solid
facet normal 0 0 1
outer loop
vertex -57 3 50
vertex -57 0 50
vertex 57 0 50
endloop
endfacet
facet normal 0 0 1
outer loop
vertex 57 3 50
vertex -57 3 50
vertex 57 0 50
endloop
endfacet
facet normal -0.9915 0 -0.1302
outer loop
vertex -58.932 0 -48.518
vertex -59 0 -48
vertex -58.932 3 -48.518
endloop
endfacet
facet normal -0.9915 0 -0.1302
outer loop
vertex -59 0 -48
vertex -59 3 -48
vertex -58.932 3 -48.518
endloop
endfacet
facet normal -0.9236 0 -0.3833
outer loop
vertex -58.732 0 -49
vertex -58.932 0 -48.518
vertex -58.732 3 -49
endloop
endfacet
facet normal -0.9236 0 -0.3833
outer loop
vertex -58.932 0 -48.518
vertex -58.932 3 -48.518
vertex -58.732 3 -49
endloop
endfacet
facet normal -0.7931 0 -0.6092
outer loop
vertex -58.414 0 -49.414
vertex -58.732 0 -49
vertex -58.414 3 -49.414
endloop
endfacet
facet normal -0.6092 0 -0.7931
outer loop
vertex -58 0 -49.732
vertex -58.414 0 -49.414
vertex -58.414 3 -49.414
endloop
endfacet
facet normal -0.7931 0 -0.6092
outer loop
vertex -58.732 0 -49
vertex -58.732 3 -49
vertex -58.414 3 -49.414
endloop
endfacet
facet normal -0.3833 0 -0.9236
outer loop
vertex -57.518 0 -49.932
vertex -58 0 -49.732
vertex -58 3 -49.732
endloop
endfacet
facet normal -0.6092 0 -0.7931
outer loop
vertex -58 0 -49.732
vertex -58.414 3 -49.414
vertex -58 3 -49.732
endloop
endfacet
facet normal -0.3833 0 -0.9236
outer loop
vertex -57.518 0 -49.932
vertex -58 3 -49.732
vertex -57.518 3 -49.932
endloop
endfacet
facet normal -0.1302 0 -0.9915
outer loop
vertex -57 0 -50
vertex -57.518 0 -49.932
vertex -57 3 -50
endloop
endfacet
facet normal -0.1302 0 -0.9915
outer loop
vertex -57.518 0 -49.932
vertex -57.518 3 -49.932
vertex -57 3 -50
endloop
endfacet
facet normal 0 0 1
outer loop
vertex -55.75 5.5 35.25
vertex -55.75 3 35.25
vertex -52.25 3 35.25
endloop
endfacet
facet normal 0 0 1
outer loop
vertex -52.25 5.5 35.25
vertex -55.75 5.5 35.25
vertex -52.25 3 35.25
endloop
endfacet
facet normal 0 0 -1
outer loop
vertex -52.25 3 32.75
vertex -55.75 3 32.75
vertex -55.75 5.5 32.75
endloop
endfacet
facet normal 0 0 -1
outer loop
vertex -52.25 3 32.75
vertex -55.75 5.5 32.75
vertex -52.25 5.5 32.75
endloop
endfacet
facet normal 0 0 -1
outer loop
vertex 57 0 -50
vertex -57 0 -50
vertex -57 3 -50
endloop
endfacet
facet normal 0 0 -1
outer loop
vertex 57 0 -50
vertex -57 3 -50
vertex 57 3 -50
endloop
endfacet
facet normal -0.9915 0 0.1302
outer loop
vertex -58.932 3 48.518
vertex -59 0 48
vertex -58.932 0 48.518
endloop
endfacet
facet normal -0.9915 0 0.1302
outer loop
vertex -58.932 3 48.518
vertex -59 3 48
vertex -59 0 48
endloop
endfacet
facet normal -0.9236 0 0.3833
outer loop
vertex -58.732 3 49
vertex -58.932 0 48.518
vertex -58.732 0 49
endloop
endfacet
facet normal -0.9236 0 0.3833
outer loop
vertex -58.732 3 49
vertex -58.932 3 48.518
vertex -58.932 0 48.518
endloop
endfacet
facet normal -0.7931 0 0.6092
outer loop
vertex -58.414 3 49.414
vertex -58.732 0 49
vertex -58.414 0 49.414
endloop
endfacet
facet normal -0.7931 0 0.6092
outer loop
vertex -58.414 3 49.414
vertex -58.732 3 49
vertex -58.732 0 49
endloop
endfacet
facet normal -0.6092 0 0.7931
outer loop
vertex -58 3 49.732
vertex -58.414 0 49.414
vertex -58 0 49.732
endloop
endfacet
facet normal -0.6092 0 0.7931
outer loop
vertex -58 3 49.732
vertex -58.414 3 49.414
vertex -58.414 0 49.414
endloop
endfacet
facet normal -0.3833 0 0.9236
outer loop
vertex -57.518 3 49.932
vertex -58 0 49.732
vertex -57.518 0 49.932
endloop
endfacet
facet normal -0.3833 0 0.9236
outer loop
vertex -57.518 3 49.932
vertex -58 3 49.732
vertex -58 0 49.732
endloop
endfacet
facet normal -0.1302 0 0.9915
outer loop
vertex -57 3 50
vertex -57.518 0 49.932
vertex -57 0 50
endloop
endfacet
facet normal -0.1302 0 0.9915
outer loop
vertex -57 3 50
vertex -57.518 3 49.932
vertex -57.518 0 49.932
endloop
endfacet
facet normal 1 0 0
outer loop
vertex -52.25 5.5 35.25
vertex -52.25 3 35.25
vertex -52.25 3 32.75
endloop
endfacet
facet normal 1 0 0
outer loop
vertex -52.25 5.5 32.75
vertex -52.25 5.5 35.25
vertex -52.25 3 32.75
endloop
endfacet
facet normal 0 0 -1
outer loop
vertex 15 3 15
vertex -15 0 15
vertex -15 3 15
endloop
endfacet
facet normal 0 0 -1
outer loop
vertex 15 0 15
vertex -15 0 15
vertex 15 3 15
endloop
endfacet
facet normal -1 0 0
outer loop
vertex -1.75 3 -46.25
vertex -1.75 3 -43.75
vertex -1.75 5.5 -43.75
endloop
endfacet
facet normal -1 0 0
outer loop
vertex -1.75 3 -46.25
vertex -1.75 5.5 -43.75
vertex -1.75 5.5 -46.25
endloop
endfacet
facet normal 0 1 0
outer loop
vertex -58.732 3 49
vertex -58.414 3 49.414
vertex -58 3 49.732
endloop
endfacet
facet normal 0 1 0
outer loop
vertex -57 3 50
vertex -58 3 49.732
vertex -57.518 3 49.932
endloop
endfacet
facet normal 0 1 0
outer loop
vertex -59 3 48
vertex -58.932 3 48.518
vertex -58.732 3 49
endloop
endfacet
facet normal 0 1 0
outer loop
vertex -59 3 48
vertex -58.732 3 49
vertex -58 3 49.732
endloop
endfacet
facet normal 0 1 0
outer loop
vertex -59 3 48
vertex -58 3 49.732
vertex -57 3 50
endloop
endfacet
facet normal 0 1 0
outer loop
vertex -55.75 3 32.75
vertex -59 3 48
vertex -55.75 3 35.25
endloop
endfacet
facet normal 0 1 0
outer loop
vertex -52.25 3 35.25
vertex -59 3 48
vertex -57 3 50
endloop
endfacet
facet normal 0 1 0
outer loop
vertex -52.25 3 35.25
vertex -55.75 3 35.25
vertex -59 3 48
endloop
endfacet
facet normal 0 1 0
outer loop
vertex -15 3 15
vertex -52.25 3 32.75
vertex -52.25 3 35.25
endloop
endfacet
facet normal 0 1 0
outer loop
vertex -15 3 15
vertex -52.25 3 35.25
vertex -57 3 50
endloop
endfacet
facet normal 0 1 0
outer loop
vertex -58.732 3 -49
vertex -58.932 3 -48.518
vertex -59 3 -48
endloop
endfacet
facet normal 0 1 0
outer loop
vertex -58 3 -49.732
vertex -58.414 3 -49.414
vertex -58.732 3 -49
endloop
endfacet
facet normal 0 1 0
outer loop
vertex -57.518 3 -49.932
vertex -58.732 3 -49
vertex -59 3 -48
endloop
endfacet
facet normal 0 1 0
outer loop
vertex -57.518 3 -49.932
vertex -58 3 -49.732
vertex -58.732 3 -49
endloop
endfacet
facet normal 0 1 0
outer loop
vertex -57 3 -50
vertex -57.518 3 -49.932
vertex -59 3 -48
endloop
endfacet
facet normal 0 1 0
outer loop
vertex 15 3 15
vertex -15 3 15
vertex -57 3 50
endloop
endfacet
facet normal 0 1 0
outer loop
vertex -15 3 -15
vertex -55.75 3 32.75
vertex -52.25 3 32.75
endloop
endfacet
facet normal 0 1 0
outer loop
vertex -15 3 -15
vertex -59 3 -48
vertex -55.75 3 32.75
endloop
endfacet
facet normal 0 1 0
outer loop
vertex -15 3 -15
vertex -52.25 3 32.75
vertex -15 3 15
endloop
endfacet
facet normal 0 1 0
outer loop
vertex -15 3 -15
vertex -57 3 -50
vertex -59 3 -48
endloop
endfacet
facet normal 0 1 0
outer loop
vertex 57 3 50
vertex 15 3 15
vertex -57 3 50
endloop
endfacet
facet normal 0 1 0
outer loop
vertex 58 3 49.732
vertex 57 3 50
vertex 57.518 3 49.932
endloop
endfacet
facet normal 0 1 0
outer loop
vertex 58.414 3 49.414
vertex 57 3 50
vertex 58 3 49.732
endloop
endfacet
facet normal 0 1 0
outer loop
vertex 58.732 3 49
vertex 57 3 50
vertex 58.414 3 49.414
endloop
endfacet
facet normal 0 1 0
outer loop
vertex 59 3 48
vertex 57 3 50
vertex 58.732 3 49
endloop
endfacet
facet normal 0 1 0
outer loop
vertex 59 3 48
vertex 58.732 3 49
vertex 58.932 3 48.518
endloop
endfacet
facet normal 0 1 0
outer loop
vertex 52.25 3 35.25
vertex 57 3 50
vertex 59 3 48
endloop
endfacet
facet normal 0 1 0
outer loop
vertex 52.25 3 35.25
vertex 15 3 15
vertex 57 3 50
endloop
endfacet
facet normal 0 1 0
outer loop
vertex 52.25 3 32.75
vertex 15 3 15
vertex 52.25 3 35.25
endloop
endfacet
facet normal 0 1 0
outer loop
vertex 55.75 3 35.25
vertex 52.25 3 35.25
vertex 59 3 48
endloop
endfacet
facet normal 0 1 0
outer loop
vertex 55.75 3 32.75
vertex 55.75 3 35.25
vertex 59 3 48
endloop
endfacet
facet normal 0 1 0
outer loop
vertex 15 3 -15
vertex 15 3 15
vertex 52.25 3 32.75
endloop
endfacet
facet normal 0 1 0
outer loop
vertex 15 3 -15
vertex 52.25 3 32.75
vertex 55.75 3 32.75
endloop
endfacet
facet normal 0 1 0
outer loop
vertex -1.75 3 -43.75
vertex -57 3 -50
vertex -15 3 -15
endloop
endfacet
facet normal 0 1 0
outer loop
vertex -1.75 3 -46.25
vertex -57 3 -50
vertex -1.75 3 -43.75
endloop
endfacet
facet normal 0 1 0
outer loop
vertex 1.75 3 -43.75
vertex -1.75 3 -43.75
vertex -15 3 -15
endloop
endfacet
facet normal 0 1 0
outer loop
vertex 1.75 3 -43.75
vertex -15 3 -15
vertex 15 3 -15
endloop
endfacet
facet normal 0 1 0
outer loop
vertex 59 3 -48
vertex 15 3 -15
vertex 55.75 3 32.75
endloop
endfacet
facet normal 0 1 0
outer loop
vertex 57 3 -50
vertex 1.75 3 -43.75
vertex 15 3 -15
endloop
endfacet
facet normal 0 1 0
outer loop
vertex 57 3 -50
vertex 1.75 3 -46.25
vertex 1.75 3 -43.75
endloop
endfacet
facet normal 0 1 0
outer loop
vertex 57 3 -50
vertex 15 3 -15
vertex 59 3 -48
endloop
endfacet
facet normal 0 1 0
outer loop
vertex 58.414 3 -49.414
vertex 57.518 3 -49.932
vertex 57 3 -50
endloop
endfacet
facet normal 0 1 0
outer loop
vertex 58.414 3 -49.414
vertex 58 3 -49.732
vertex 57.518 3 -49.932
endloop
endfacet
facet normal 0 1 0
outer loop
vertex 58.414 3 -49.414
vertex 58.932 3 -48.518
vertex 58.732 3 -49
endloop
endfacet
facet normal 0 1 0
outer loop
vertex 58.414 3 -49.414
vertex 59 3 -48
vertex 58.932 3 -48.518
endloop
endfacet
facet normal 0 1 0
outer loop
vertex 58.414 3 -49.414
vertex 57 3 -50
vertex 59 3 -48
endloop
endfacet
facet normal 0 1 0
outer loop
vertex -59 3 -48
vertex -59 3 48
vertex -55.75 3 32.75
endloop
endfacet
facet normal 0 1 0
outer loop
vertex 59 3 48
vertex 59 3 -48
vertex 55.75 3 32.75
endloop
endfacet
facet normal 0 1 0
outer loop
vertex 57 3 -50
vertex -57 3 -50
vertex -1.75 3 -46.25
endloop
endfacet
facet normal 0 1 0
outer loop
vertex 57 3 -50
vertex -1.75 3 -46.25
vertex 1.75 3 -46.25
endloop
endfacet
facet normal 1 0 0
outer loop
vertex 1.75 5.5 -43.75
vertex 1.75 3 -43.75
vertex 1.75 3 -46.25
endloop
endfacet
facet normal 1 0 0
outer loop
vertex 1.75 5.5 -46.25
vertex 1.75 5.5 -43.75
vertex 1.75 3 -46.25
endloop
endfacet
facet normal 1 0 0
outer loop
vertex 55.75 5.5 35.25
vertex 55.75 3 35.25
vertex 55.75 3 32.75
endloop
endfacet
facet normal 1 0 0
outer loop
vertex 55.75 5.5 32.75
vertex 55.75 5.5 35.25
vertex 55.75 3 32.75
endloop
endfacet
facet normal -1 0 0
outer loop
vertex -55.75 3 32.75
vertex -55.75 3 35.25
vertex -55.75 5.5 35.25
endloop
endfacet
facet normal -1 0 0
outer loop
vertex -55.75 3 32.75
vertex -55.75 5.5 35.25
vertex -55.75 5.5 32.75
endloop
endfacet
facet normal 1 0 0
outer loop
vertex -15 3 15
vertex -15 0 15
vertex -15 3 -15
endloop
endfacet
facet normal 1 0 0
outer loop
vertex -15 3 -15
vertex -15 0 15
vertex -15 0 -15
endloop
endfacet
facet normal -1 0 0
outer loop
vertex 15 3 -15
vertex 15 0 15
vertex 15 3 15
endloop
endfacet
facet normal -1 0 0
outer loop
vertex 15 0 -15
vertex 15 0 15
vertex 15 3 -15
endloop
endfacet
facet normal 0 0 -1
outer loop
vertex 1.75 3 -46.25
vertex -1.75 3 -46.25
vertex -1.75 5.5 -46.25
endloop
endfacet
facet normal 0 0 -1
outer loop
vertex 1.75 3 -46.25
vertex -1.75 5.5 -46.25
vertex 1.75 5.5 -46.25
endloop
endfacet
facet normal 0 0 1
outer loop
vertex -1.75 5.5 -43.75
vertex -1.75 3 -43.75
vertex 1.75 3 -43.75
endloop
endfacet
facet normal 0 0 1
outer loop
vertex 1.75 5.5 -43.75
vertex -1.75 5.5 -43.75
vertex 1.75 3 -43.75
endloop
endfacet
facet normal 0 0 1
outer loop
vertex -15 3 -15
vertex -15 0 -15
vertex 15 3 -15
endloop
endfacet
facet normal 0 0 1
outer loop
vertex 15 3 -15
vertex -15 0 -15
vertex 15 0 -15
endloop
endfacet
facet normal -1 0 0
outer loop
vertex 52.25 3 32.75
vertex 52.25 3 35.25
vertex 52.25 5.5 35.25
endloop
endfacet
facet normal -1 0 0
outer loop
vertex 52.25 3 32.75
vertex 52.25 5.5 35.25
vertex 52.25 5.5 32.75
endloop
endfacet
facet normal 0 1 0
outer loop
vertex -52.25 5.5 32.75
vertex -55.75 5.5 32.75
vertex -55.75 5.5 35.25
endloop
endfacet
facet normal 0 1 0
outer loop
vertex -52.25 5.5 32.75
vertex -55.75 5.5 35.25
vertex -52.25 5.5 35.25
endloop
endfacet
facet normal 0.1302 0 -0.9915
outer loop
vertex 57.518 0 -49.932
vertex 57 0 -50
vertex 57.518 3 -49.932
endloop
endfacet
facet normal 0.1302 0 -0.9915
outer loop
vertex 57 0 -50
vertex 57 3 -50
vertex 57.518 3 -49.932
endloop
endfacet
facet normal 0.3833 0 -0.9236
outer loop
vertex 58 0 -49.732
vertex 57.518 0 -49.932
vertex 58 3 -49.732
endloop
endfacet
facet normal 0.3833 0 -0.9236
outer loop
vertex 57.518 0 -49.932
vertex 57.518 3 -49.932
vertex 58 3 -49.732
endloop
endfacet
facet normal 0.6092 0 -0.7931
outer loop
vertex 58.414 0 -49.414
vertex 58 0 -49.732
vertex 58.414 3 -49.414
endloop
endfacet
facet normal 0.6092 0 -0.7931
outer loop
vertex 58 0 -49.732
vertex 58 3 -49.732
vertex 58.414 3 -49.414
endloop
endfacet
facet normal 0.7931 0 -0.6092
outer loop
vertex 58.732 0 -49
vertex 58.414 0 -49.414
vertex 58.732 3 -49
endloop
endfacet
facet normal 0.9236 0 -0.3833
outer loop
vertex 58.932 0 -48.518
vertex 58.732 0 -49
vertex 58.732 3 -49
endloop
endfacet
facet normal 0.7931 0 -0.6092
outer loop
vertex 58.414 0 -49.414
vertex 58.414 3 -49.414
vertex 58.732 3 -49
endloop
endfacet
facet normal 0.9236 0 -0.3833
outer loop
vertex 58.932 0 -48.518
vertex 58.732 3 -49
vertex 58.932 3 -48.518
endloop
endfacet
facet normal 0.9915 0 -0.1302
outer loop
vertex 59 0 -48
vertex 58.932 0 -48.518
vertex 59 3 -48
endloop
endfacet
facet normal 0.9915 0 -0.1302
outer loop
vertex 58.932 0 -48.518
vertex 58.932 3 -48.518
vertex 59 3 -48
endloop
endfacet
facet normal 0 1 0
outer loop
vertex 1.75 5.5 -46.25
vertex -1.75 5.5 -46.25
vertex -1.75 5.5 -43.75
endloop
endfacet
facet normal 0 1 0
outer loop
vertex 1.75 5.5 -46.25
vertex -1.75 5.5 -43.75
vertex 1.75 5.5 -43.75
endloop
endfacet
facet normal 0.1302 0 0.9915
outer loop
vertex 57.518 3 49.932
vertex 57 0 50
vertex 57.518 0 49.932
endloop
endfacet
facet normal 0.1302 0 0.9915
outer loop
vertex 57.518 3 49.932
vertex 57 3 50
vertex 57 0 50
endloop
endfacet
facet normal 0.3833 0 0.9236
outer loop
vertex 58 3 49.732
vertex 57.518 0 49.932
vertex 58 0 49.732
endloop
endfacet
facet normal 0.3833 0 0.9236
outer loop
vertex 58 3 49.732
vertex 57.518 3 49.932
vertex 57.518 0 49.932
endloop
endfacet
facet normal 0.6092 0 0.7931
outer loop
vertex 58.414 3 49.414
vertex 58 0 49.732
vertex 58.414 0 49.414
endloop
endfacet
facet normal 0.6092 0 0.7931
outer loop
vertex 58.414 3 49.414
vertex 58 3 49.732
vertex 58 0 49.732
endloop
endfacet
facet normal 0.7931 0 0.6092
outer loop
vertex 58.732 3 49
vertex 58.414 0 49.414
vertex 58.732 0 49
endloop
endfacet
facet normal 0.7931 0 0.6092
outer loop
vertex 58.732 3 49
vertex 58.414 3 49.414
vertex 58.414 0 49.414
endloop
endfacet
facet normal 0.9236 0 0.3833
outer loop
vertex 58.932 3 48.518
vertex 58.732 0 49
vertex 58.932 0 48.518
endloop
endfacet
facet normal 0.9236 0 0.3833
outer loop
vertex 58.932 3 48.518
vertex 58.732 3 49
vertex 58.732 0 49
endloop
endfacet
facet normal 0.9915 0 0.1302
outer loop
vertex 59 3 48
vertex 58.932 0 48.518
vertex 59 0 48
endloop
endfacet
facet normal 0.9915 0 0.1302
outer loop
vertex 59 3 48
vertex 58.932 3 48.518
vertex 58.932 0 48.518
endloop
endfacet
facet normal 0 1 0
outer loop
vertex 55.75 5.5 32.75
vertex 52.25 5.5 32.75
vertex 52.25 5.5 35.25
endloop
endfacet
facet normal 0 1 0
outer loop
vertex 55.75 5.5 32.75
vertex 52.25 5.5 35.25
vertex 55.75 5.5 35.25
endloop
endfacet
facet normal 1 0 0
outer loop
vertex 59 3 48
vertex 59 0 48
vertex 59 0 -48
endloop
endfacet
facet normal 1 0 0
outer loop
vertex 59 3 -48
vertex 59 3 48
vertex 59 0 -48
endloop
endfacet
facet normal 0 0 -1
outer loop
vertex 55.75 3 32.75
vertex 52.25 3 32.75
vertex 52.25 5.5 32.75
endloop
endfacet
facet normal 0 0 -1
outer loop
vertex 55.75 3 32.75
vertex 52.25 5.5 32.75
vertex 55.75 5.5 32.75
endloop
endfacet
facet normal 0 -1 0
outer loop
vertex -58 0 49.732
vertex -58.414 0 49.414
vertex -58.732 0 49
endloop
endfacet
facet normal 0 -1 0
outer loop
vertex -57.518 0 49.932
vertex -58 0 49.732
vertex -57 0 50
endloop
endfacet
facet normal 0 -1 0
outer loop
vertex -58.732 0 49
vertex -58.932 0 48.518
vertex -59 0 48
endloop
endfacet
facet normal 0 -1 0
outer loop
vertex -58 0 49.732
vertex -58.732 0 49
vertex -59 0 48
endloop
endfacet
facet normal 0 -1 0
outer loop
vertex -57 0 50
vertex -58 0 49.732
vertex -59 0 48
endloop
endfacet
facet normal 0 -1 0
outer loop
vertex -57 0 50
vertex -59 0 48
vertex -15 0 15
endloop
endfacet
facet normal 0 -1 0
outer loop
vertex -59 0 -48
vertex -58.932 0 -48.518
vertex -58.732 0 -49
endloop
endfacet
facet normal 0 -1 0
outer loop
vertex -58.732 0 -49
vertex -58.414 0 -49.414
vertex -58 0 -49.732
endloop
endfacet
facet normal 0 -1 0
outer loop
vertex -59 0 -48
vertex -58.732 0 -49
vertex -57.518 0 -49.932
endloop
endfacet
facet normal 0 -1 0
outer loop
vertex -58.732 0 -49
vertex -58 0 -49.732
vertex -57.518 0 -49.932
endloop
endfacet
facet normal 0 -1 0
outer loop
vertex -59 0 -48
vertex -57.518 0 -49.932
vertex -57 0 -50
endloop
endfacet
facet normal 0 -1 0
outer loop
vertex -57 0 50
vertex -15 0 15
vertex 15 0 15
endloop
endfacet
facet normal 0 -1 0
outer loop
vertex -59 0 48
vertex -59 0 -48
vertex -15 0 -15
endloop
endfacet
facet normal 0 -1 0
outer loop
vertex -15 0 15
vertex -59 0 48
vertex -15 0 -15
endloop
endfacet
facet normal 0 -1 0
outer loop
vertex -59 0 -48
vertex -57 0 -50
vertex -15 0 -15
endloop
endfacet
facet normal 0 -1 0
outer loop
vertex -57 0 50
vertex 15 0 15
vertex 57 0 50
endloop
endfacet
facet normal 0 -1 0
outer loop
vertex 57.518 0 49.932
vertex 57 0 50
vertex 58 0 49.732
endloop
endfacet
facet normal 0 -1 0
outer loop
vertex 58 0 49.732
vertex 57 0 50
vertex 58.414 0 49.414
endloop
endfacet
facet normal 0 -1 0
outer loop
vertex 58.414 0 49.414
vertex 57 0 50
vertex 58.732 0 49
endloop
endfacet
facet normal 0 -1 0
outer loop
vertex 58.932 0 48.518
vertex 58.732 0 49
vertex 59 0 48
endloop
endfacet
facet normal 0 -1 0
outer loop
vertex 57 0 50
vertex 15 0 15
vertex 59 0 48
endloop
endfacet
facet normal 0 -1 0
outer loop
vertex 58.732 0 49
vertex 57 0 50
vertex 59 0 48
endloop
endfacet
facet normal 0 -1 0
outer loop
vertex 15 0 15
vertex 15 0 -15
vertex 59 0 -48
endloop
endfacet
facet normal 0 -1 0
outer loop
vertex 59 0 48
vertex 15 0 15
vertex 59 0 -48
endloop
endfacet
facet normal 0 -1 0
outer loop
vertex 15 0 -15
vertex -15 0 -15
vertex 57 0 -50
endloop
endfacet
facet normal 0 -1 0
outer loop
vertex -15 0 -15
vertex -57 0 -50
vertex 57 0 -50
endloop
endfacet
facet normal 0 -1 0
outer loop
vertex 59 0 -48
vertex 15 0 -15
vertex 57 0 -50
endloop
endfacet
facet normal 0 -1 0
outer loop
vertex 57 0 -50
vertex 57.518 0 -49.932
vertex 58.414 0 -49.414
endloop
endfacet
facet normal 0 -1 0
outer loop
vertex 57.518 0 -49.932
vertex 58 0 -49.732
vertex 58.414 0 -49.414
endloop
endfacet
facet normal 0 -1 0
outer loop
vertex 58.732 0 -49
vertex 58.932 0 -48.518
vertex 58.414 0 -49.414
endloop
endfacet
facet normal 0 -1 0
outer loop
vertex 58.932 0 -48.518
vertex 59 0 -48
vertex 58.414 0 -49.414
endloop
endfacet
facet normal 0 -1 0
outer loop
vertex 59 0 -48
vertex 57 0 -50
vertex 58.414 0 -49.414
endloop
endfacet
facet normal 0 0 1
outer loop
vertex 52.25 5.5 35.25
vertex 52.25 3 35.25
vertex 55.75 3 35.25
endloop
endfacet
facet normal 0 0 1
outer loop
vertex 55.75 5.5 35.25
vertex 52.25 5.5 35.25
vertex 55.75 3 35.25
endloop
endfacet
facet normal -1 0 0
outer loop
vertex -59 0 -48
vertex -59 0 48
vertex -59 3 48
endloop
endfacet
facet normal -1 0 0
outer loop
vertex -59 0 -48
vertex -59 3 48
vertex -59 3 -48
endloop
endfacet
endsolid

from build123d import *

# Parameters (mm, degrees)
SKETCH1_W           = 118
SKETCH1_H           = 100
SKETCH1_W_2         = 30
SKETCH1_H_2         = 30
BOSS_EXTRUDE1_DEPTH = 3
SKETCH2_W           = 3.5
SKETCH2_H           = 2.5
BOSS_EXTRUDE2_DEPTH = 2.5
FILLET1_R           = 2


with BuildPart() as part:
    # Sketch1 → Boss-Extrude1 (new body)
    with BuildSketch(Plane(origin=(0, 0, 0), x_dir=(1, 0, 0), z_dir=(0, 1, 0))):
        Rectangle(SKETCH1_W, SKETCH1_H)
        Rectangle(SKETCH1_W_2, SKETCH1_H_2, mode=Mode.SUBTRACT)
    extrude(amount=BOSS_EXTRUDE1_DEPTH)

    # Sketch2 → Boss-Extrude2 (add)
    with BuildSketch(Plane(origin=(0, 3, 0), x_dir=(1, 0, 0), z_dir=(0, 1, 0))):
        with Locations((54, -34)):
            Rectangle(SKETCH2_W, SKETCH2_H)
        with Locations((-54, -34)):
            Rectangle(SKETCH2_W, SKETCH2_H)
        with Locations((0, 45)):
            Rectangle(SKETCH2_W, SKETCH2_H)
    extrude(amount=BOSS_EXTRUDE2_DEPTH)

    # Fillet1
    fillet1_edges = [part.edges().sort_by_distance(p)[0] for p in [
        (59, 1.5, 50),
        (-59, 1.5, 50),
        (-59, 1.5, -50),
        (59, 1.5, -50),
    ]]
    fillet(fillet1_edges, radius=FILLET1_R)


solid = part.part
